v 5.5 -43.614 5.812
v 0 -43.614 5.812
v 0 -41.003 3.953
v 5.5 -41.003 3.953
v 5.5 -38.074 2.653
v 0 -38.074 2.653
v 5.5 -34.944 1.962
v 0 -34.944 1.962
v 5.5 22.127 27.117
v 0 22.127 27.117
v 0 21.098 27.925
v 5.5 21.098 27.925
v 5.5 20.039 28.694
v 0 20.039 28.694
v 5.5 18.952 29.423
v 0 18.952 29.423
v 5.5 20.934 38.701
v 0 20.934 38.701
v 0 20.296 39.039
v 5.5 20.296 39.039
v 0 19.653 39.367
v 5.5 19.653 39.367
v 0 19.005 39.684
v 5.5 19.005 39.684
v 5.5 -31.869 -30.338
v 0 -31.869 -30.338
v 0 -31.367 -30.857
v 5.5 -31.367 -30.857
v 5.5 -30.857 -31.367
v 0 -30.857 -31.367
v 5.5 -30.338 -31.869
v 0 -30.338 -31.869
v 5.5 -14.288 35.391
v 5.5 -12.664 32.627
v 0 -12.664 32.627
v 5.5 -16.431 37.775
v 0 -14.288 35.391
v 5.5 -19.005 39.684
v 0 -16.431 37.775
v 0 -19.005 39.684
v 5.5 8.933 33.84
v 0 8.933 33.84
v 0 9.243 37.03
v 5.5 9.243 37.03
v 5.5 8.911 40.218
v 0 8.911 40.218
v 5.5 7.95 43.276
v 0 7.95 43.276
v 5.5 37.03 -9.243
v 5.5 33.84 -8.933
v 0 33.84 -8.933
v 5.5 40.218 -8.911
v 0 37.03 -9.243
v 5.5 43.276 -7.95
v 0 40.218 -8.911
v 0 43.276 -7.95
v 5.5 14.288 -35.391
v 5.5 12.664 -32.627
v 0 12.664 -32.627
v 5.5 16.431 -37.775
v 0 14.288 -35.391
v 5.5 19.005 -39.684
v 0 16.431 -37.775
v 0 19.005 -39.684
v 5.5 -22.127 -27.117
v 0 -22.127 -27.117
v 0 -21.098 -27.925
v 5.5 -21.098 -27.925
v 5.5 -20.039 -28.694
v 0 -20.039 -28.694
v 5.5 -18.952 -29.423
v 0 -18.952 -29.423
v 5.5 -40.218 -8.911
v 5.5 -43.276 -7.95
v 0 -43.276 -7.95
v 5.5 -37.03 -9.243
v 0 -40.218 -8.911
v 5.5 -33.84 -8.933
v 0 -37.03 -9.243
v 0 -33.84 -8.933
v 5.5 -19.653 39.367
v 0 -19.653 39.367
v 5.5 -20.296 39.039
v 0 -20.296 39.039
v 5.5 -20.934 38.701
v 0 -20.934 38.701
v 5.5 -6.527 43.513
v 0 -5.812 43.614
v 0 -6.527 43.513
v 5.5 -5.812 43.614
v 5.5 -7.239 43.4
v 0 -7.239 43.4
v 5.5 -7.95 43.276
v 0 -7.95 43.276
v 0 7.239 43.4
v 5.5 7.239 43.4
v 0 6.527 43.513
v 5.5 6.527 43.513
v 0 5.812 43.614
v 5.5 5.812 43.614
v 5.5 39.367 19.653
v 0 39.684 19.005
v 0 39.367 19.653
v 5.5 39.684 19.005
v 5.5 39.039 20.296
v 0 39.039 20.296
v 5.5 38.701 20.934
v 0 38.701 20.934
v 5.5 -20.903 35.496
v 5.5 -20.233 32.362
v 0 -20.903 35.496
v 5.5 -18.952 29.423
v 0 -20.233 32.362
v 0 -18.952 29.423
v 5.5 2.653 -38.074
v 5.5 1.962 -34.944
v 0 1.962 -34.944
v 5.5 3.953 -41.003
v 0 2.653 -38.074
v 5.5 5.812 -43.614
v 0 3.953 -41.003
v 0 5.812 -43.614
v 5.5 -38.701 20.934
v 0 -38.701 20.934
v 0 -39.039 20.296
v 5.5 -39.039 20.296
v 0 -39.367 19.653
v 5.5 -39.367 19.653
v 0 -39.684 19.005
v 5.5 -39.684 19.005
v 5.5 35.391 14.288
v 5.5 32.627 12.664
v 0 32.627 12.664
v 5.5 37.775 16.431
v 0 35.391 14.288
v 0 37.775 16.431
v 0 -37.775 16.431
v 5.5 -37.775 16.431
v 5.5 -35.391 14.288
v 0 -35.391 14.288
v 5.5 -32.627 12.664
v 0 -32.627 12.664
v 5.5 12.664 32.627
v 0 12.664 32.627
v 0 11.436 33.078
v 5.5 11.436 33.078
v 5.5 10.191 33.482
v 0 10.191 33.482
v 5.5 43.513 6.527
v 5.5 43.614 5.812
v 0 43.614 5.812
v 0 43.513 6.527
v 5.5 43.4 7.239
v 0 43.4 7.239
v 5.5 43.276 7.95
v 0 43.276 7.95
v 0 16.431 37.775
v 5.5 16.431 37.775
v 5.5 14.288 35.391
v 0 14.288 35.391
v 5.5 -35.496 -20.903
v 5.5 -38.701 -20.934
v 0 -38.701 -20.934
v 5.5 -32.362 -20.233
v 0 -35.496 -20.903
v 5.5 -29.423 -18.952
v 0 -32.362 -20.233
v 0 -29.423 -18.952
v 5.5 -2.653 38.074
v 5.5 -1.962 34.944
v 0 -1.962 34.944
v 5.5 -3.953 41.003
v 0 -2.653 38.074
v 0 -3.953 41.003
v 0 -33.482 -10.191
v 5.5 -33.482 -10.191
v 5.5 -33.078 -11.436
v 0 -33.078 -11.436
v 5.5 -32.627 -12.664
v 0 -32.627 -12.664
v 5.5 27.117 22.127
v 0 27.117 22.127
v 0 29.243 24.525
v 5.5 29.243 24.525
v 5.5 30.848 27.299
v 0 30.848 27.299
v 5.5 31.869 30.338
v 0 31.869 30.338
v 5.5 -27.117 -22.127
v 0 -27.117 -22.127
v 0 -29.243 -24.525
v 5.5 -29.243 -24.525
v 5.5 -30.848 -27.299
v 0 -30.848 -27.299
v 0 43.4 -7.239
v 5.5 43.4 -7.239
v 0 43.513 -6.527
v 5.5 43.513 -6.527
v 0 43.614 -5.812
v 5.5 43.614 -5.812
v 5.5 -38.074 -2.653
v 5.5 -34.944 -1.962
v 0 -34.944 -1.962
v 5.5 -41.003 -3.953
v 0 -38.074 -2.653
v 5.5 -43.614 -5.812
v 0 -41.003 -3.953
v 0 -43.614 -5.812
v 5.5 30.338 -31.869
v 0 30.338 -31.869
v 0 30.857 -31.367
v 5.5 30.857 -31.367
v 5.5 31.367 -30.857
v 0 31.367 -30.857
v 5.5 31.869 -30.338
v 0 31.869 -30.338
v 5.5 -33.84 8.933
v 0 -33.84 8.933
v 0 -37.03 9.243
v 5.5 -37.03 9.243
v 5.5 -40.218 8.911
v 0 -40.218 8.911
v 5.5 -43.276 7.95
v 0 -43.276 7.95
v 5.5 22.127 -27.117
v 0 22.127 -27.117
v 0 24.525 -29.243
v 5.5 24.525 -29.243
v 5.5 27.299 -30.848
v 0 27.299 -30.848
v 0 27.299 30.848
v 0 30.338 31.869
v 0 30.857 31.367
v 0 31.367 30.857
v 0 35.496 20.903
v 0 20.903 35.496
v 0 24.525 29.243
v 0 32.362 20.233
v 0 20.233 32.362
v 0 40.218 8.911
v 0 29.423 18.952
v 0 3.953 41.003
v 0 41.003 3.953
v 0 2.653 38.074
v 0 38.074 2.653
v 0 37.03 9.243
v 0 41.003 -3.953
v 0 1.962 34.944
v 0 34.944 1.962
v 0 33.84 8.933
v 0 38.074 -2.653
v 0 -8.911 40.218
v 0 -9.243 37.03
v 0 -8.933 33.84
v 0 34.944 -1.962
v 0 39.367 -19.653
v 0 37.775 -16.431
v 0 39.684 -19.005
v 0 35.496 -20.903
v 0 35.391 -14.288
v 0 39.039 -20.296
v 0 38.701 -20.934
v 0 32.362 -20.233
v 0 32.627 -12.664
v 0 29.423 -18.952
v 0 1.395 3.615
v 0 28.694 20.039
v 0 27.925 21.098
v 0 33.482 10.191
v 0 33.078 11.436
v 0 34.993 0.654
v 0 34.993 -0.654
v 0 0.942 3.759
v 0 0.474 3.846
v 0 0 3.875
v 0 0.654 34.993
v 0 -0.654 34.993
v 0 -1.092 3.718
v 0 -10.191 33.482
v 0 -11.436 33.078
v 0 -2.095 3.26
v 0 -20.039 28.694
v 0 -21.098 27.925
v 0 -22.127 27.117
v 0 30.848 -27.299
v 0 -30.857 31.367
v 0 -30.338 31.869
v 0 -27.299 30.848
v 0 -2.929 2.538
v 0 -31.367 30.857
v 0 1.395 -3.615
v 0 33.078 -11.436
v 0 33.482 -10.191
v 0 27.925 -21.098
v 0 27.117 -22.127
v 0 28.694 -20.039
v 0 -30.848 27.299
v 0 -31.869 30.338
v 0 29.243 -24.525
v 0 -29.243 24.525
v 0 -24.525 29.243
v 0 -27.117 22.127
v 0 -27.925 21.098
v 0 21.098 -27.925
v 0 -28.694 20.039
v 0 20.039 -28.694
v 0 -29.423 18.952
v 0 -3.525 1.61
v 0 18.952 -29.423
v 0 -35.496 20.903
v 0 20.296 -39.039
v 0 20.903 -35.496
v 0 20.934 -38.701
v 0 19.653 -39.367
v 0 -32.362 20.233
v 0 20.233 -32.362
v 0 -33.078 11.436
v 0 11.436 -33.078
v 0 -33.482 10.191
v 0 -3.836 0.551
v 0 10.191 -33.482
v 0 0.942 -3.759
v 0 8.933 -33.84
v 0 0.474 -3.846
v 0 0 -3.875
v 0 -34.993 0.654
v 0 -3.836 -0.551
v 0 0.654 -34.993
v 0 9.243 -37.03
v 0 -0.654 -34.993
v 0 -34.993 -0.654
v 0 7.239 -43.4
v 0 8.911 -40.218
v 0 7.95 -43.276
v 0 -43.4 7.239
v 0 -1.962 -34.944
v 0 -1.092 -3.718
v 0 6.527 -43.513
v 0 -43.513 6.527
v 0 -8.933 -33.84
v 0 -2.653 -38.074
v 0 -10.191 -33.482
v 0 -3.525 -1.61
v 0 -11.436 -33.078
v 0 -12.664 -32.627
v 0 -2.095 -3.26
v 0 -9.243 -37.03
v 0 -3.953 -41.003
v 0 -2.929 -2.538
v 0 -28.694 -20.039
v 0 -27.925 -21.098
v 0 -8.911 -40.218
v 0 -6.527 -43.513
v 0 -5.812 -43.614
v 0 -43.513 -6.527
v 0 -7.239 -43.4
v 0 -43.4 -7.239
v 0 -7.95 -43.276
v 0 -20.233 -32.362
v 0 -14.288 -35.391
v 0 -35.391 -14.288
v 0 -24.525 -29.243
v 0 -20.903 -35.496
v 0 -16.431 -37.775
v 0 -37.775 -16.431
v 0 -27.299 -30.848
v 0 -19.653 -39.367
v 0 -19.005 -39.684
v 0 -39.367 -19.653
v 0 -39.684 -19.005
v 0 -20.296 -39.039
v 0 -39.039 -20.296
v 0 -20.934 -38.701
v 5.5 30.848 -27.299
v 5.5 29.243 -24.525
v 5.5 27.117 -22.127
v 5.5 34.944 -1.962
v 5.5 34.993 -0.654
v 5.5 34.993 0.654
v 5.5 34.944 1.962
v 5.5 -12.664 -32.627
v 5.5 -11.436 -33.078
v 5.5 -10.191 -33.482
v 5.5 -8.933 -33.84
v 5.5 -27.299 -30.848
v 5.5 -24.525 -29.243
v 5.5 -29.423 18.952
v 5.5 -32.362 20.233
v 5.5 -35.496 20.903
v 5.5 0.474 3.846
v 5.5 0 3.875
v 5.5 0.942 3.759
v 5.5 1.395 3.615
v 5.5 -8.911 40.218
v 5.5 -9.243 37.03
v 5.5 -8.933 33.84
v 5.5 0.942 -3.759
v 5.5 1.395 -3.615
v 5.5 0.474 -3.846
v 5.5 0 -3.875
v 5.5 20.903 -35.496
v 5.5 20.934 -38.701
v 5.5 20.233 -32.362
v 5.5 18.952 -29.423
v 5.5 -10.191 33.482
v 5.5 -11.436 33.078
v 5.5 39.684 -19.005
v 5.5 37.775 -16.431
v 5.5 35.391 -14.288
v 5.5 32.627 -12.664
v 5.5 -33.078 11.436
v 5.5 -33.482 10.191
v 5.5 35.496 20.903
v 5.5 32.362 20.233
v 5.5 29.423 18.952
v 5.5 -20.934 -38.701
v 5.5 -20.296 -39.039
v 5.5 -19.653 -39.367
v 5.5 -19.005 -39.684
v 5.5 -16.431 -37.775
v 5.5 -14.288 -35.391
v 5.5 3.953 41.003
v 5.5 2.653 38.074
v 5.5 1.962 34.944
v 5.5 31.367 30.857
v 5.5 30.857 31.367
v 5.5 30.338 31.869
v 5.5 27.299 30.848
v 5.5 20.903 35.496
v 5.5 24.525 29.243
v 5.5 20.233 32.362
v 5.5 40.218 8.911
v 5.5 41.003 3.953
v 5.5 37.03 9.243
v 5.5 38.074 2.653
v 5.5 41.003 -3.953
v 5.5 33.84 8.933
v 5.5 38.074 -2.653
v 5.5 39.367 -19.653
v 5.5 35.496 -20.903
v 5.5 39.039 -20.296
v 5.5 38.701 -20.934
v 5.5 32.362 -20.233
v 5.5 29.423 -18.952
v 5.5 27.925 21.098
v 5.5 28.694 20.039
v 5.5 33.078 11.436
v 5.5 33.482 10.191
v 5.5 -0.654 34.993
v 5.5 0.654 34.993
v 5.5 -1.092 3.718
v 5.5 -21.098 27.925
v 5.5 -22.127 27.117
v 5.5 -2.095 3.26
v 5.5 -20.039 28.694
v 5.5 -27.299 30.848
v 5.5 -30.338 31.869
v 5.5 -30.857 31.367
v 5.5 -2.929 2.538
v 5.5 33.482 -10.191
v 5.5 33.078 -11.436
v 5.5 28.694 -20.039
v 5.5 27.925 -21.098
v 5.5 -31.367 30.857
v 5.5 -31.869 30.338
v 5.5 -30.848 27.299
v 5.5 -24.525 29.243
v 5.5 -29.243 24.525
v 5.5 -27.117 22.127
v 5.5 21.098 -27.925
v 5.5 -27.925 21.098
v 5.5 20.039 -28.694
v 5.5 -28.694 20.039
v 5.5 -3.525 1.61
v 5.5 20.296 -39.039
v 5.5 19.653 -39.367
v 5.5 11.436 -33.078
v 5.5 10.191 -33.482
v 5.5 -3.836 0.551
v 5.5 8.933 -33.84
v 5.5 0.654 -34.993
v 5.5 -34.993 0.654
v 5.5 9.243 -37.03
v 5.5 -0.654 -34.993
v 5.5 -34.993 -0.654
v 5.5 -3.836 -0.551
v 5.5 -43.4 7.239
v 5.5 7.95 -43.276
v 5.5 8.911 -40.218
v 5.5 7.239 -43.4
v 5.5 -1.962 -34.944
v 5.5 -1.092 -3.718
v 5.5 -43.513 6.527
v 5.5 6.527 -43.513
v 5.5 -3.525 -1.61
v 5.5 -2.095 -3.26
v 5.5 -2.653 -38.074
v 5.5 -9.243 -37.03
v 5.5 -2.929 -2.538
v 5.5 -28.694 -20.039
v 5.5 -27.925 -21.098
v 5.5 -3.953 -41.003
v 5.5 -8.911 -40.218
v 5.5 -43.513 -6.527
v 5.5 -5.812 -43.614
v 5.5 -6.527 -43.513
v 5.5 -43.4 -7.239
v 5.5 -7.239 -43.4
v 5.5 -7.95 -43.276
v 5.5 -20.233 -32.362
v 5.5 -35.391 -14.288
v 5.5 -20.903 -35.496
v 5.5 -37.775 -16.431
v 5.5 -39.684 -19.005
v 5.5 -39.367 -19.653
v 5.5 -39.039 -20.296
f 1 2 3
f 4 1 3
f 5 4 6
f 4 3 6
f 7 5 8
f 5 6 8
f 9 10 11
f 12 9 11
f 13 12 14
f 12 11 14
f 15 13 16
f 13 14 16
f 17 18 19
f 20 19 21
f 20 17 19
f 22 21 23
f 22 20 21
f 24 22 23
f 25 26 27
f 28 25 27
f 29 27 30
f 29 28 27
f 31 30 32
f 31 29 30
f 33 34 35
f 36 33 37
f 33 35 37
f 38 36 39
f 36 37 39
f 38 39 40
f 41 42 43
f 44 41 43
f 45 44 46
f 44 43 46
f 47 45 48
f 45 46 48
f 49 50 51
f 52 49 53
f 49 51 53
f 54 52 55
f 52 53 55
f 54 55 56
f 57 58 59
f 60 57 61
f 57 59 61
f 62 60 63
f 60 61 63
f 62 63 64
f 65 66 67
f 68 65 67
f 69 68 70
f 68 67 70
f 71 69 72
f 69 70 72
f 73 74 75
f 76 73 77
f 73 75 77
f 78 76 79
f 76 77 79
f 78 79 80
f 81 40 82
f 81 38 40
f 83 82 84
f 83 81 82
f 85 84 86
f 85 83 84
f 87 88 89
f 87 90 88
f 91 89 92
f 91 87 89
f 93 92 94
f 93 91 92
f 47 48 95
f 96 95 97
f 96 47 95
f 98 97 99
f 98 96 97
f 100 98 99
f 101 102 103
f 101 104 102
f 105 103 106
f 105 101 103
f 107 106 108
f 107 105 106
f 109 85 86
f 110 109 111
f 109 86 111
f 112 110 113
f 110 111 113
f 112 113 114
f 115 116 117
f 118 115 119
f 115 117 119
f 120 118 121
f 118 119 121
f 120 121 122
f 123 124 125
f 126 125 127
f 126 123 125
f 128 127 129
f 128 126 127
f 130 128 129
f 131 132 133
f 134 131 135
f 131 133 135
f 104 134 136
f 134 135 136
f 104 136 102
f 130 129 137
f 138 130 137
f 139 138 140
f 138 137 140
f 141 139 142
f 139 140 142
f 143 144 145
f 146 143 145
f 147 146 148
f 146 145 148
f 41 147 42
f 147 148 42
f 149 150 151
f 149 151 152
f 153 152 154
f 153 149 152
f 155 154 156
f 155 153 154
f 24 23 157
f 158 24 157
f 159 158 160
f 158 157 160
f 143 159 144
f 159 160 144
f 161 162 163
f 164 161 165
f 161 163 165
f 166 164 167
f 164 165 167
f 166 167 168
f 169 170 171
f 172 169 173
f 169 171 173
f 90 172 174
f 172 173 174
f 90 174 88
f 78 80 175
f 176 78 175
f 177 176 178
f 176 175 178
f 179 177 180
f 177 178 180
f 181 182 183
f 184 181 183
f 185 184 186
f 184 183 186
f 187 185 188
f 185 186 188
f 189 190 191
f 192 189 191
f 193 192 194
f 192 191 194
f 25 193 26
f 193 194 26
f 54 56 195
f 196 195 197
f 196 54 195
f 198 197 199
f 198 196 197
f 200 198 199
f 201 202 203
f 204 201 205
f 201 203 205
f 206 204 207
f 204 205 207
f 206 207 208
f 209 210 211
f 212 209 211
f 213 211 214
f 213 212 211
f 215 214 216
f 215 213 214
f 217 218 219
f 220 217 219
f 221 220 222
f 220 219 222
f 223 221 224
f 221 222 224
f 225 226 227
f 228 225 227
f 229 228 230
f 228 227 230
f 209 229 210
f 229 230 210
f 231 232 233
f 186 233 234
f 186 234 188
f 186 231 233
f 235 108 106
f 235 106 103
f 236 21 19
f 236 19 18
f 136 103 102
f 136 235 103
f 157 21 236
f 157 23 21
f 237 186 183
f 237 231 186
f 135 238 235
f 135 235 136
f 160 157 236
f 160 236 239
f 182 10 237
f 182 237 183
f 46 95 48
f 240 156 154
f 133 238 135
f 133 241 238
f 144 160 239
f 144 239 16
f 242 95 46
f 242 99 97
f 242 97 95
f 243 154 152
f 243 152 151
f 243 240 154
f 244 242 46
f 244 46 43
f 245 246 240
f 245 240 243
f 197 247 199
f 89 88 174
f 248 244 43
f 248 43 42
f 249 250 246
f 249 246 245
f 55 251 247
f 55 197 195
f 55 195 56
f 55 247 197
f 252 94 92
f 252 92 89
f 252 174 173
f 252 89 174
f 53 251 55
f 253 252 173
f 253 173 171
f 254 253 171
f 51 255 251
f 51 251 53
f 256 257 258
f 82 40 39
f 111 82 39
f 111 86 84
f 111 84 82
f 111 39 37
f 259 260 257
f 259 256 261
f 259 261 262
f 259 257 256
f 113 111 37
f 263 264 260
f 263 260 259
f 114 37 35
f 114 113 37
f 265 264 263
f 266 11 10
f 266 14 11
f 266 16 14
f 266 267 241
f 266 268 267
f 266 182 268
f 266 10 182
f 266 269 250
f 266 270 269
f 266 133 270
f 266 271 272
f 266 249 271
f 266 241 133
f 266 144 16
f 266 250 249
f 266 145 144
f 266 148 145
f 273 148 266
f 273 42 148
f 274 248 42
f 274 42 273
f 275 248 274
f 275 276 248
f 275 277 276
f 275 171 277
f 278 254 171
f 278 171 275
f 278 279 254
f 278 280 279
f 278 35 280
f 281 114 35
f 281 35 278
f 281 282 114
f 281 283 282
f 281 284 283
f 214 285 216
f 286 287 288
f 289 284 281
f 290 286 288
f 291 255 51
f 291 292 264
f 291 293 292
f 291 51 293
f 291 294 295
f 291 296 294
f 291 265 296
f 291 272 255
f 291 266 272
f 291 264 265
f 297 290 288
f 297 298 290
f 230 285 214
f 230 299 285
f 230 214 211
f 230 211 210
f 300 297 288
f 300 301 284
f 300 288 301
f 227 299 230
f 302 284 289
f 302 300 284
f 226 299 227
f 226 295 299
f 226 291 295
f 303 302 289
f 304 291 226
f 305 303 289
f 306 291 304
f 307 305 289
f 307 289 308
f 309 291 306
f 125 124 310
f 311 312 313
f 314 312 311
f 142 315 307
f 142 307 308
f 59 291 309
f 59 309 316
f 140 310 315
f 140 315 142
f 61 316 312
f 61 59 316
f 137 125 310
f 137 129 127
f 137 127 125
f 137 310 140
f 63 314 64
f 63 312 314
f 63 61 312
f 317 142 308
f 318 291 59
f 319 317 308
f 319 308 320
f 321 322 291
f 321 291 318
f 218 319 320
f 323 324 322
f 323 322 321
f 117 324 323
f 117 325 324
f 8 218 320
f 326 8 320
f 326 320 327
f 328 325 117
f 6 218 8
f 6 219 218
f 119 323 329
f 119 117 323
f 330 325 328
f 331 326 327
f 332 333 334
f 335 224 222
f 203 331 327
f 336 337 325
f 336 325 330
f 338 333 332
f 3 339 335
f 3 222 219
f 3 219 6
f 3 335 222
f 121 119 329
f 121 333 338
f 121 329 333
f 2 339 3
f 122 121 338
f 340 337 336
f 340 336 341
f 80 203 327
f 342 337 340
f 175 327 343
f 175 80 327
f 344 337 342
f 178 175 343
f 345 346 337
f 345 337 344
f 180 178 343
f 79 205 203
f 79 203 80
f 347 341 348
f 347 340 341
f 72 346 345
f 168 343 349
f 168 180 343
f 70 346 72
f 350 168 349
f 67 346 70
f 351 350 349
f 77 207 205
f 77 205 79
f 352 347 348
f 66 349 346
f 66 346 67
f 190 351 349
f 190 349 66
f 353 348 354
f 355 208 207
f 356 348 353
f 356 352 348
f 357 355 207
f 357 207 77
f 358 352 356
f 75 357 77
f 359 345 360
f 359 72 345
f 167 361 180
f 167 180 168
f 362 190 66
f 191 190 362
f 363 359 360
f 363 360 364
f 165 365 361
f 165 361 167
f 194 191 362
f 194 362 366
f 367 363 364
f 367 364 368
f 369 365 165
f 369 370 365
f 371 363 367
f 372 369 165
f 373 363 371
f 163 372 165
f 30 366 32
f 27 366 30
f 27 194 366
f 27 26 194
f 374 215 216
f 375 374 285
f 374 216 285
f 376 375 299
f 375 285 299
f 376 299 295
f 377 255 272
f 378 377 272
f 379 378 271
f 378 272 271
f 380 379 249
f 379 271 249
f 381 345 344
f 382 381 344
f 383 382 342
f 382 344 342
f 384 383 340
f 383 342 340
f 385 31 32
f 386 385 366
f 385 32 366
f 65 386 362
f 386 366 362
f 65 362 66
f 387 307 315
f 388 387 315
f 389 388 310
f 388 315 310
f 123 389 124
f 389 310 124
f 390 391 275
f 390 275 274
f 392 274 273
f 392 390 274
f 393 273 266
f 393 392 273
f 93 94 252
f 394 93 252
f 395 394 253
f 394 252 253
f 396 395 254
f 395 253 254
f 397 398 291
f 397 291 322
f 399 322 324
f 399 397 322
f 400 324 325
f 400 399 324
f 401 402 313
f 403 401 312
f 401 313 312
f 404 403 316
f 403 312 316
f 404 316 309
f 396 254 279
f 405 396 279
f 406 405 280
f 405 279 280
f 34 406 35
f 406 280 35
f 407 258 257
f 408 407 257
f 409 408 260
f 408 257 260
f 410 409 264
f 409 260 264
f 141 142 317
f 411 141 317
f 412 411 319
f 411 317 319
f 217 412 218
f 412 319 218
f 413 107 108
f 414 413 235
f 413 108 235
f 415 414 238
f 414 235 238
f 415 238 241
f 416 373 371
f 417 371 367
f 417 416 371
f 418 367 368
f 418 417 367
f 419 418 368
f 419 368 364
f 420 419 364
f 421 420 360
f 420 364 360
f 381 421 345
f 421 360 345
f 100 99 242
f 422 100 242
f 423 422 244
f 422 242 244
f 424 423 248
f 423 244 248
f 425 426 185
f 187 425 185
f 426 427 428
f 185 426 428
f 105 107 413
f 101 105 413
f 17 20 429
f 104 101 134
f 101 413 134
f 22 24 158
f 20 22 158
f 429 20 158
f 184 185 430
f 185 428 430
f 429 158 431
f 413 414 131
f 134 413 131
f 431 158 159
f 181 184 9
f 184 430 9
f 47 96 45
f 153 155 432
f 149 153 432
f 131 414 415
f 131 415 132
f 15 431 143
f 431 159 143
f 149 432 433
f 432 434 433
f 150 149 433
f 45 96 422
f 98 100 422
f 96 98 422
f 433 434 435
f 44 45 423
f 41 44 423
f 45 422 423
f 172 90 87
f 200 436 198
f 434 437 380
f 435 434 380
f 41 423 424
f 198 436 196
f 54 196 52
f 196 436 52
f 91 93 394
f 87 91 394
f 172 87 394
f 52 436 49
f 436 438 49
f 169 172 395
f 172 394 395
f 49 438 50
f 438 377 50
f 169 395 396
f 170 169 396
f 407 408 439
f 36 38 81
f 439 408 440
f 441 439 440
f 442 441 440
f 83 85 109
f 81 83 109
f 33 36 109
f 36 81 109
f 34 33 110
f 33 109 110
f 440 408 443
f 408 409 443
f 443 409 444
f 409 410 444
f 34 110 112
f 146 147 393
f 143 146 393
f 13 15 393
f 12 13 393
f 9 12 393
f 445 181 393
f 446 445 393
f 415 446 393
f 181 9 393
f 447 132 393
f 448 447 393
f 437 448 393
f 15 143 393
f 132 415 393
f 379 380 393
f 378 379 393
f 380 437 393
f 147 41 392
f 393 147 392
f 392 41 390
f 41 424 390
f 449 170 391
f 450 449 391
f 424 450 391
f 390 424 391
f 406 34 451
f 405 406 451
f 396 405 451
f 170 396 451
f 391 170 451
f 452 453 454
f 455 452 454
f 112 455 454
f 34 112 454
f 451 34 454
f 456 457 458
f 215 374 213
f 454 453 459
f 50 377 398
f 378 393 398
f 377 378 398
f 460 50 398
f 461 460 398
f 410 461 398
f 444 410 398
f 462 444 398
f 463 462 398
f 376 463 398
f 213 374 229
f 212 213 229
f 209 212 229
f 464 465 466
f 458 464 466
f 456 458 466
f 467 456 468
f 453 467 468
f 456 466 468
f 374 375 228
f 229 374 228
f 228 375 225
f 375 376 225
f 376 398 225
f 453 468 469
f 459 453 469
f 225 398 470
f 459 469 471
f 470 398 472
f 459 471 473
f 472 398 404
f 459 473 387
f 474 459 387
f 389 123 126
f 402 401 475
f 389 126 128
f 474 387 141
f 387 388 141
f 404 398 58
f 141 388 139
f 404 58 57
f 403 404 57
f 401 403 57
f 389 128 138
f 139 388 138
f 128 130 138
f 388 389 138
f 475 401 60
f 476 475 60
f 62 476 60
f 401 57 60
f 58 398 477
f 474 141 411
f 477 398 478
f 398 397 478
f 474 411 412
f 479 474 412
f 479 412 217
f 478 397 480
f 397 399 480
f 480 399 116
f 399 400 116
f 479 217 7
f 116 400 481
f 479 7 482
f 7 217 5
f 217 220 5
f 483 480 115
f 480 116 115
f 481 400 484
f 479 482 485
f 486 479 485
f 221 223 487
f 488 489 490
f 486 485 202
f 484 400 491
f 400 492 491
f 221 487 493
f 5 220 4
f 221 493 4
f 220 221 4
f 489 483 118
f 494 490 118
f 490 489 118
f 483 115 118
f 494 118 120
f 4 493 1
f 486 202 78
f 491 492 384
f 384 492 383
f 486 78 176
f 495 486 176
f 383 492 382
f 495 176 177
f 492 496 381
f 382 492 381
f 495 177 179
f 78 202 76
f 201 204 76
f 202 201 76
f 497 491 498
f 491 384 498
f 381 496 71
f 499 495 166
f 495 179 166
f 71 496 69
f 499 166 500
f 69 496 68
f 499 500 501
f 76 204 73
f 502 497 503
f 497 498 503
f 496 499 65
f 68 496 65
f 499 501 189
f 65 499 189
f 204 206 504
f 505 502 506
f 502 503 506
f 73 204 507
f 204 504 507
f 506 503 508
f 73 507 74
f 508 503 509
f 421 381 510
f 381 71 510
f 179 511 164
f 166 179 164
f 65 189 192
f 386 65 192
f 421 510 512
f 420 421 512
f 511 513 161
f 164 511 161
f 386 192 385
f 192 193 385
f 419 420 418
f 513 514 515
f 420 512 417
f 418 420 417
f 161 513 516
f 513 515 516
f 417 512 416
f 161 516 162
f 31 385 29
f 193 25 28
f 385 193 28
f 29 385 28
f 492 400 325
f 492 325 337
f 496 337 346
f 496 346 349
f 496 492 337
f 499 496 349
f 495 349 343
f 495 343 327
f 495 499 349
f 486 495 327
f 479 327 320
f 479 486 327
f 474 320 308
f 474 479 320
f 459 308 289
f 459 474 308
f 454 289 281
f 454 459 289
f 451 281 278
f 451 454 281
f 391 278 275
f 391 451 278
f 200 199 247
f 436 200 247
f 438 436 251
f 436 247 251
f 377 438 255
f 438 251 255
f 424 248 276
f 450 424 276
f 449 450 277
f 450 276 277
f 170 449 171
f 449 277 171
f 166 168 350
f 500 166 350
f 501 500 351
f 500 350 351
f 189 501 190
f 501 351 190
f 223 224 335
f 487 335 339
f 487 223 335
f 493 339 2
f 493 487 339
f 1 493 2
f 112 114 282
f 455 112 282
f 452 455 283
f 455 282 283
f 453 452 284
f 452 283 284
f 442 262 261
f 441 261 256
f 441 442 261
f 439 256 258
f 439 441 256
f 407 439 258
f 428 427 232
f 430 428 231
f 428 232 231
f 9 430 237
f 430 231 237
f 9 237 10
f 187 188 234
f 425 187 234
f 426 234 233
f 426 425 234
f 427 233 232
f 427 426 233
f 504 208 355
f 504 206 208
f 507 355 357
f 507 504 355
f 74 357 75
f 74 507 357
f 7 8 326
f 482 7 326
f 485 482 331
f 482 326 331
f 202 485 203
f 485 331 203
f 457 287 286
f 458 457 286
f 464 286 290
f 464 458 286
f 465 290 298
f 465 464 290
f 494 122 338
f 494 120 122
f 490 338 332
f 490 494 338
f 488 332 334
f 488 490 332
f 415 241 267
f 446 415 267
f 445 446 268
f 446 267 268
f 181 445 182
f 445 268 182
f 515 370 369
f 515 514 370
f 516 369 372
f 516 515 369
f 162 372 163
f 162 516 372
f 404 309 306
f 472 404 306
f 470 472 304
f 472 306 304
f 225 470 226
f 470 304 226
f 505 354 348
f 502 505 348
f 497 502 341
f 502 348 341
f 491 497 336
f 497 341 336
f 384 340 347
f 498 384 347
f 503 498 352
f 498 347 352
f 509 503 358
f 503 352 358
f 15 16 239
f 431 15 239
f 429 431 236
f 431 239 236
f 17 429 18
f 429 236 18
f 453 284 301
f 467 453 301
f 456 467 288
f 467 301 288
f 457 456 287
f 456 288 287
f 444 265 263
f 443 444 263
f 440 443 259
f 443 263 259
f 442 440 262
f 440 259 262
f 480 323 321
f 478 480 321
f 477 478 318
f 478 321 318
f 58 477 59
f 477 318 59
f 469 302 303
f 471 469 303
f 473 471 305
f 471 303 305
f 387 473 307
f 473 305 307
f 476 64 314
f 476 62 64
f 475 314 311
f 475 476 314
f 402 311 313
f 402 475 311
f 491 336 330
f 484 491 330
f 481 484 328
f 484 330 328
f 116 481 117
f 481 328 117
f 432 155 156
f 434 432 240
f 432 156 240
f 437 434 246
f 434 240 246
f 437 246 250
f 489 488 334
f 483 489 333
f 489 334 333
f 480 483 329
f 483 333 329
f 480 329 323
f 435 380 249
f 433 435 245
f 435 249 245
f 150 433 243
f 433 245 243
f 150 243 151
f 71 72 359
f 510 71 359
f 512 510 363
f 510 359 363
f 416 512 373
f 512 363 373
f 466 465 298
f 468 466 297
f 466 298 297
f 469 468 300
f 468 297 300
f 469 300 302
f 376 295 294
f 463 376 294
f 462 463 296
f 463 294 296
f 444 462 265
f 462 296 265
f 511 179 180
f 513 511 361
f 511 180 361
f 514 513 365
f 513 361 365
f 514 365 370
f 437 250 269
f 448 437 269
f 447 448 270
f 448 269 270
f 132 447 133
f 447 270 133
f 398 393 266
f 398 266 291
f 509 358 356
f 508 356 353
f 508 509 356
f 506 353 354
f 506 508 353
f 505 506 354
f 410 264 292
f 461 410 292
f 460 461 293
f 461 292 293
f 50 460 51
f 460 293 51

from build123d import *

# Parameters (mm, degrees)
BASPROSKE_W           = 5.5
BASPROSKE_H           = 44
TOOTHCUT_DEPTH        = 63.467991804
TEETHCUTS_COUNT       = 20
TEETHCUTS_ANGLE       = 342
BORSKE_R              = 0.5
BORE_DEPTH            = 50.0000508
CORTAR_EXTRUIR1_DEPTH = 5.5


with BuildPart() as part:
    # BasProSke → Base-Revolve (revolve)
    with BuildSketch(Plane(origin=(0, 0, 0), x_dir=(1, 0, 0), z_dir=(0, 1, 0)), mode=Mode.PRIVATE) as base_revolve_sk:
        with Locations((2.75, 22)):
            Rectangle(BASPROSKE_W, BASPROSKE_H)
    revolve(base_revolve_sk.sketch.rotate(Axis((-10, 0, 0), (1, 0, 0)), 180), axis=Axis((-10, 0, 0), (1, 0, 0)))

    # TooCutSke → ToothCut (cut, through all)
    with BuildSketch(Plane(origin=(0, 0, 0), x_dir=(0, 0, -1), z_dir=(1, 0, 0))):
        with BuildLine():
            ThreePointArc((1.961730392, 34.943978235), (0, 34.999), (-1.961730392, 34.943978235))
            ThreePointArc((-1.961730392, 34.943978235), (-3.235659864, 39.585086827), (-5.832115241, 43.637395396))
            ThreePointArc((-5.832115241, 43.637395396), (0, 44.0254), (5.832115241, 43.637395396))
            ThreePointArc((5.832115241, 43.637395396), (3.235659864, 39.585086827), (1.961730392, 34.943978235))
        make_face()
    toothcut = extrude(amount=TOOTHCUT_DEPTH, mode=Mode.SUBTRACT)

    # TeethCuts: ToothCut ×20 about axis
    teethcuts_axis = Axis((-10, 0, 0), (1, 0, 0))
    for i in range(1, TEETHCUTS_COUNT):
        add(toothcut.rotate(teethcuts_axis, i * TEETHCUTS_ANGLE / (TEETHCUTS_COUNT - 1)), mode=Mode.SUBTRACT)

    # BorSke → Bore (cut, symmetric)
    with BuildSketch(Plane(origin=(0, 0, 0), x_dir=(0, 0, -1), z_dir=(1, 0, 0))):
        with Locations(Location((0, 0, 0), (0, 0, 180))):
            Circle(BORSKE_R)
    extrude(amount=BORE_DEPTH, both=True, mode=Mode.SUBTRACT)

    # Croquis1 → Cortar-Extruir1 (cut)
    with BuildSketch(Plane(origin=(5.5, 0, 0), x_dir=(0, 0, -1), z_dir=(1, 0, 0))):
        with BuildLine():
            Line((0, 1.395), (3.615190175, 1.395))
            ThreePointArc((3.615190175, 1.395), (3.809493859, 0.709493859), (3.875, 0))
            ThreePointArc((3.875, 0), (0, -3.875), (-3.875, 0))
            ThreePointArc((-3.875, 0), (-3.809493859, 0.709493859), (-3.615190175, 1.395))
            Line((-3.615190175, 1.395), (0, 1.395))
        make_face()
    extrude(amount=-CORTAR_EXTRUIR1_DEPTH, mode=Mode.SUBTRACT)


solid = part.part
